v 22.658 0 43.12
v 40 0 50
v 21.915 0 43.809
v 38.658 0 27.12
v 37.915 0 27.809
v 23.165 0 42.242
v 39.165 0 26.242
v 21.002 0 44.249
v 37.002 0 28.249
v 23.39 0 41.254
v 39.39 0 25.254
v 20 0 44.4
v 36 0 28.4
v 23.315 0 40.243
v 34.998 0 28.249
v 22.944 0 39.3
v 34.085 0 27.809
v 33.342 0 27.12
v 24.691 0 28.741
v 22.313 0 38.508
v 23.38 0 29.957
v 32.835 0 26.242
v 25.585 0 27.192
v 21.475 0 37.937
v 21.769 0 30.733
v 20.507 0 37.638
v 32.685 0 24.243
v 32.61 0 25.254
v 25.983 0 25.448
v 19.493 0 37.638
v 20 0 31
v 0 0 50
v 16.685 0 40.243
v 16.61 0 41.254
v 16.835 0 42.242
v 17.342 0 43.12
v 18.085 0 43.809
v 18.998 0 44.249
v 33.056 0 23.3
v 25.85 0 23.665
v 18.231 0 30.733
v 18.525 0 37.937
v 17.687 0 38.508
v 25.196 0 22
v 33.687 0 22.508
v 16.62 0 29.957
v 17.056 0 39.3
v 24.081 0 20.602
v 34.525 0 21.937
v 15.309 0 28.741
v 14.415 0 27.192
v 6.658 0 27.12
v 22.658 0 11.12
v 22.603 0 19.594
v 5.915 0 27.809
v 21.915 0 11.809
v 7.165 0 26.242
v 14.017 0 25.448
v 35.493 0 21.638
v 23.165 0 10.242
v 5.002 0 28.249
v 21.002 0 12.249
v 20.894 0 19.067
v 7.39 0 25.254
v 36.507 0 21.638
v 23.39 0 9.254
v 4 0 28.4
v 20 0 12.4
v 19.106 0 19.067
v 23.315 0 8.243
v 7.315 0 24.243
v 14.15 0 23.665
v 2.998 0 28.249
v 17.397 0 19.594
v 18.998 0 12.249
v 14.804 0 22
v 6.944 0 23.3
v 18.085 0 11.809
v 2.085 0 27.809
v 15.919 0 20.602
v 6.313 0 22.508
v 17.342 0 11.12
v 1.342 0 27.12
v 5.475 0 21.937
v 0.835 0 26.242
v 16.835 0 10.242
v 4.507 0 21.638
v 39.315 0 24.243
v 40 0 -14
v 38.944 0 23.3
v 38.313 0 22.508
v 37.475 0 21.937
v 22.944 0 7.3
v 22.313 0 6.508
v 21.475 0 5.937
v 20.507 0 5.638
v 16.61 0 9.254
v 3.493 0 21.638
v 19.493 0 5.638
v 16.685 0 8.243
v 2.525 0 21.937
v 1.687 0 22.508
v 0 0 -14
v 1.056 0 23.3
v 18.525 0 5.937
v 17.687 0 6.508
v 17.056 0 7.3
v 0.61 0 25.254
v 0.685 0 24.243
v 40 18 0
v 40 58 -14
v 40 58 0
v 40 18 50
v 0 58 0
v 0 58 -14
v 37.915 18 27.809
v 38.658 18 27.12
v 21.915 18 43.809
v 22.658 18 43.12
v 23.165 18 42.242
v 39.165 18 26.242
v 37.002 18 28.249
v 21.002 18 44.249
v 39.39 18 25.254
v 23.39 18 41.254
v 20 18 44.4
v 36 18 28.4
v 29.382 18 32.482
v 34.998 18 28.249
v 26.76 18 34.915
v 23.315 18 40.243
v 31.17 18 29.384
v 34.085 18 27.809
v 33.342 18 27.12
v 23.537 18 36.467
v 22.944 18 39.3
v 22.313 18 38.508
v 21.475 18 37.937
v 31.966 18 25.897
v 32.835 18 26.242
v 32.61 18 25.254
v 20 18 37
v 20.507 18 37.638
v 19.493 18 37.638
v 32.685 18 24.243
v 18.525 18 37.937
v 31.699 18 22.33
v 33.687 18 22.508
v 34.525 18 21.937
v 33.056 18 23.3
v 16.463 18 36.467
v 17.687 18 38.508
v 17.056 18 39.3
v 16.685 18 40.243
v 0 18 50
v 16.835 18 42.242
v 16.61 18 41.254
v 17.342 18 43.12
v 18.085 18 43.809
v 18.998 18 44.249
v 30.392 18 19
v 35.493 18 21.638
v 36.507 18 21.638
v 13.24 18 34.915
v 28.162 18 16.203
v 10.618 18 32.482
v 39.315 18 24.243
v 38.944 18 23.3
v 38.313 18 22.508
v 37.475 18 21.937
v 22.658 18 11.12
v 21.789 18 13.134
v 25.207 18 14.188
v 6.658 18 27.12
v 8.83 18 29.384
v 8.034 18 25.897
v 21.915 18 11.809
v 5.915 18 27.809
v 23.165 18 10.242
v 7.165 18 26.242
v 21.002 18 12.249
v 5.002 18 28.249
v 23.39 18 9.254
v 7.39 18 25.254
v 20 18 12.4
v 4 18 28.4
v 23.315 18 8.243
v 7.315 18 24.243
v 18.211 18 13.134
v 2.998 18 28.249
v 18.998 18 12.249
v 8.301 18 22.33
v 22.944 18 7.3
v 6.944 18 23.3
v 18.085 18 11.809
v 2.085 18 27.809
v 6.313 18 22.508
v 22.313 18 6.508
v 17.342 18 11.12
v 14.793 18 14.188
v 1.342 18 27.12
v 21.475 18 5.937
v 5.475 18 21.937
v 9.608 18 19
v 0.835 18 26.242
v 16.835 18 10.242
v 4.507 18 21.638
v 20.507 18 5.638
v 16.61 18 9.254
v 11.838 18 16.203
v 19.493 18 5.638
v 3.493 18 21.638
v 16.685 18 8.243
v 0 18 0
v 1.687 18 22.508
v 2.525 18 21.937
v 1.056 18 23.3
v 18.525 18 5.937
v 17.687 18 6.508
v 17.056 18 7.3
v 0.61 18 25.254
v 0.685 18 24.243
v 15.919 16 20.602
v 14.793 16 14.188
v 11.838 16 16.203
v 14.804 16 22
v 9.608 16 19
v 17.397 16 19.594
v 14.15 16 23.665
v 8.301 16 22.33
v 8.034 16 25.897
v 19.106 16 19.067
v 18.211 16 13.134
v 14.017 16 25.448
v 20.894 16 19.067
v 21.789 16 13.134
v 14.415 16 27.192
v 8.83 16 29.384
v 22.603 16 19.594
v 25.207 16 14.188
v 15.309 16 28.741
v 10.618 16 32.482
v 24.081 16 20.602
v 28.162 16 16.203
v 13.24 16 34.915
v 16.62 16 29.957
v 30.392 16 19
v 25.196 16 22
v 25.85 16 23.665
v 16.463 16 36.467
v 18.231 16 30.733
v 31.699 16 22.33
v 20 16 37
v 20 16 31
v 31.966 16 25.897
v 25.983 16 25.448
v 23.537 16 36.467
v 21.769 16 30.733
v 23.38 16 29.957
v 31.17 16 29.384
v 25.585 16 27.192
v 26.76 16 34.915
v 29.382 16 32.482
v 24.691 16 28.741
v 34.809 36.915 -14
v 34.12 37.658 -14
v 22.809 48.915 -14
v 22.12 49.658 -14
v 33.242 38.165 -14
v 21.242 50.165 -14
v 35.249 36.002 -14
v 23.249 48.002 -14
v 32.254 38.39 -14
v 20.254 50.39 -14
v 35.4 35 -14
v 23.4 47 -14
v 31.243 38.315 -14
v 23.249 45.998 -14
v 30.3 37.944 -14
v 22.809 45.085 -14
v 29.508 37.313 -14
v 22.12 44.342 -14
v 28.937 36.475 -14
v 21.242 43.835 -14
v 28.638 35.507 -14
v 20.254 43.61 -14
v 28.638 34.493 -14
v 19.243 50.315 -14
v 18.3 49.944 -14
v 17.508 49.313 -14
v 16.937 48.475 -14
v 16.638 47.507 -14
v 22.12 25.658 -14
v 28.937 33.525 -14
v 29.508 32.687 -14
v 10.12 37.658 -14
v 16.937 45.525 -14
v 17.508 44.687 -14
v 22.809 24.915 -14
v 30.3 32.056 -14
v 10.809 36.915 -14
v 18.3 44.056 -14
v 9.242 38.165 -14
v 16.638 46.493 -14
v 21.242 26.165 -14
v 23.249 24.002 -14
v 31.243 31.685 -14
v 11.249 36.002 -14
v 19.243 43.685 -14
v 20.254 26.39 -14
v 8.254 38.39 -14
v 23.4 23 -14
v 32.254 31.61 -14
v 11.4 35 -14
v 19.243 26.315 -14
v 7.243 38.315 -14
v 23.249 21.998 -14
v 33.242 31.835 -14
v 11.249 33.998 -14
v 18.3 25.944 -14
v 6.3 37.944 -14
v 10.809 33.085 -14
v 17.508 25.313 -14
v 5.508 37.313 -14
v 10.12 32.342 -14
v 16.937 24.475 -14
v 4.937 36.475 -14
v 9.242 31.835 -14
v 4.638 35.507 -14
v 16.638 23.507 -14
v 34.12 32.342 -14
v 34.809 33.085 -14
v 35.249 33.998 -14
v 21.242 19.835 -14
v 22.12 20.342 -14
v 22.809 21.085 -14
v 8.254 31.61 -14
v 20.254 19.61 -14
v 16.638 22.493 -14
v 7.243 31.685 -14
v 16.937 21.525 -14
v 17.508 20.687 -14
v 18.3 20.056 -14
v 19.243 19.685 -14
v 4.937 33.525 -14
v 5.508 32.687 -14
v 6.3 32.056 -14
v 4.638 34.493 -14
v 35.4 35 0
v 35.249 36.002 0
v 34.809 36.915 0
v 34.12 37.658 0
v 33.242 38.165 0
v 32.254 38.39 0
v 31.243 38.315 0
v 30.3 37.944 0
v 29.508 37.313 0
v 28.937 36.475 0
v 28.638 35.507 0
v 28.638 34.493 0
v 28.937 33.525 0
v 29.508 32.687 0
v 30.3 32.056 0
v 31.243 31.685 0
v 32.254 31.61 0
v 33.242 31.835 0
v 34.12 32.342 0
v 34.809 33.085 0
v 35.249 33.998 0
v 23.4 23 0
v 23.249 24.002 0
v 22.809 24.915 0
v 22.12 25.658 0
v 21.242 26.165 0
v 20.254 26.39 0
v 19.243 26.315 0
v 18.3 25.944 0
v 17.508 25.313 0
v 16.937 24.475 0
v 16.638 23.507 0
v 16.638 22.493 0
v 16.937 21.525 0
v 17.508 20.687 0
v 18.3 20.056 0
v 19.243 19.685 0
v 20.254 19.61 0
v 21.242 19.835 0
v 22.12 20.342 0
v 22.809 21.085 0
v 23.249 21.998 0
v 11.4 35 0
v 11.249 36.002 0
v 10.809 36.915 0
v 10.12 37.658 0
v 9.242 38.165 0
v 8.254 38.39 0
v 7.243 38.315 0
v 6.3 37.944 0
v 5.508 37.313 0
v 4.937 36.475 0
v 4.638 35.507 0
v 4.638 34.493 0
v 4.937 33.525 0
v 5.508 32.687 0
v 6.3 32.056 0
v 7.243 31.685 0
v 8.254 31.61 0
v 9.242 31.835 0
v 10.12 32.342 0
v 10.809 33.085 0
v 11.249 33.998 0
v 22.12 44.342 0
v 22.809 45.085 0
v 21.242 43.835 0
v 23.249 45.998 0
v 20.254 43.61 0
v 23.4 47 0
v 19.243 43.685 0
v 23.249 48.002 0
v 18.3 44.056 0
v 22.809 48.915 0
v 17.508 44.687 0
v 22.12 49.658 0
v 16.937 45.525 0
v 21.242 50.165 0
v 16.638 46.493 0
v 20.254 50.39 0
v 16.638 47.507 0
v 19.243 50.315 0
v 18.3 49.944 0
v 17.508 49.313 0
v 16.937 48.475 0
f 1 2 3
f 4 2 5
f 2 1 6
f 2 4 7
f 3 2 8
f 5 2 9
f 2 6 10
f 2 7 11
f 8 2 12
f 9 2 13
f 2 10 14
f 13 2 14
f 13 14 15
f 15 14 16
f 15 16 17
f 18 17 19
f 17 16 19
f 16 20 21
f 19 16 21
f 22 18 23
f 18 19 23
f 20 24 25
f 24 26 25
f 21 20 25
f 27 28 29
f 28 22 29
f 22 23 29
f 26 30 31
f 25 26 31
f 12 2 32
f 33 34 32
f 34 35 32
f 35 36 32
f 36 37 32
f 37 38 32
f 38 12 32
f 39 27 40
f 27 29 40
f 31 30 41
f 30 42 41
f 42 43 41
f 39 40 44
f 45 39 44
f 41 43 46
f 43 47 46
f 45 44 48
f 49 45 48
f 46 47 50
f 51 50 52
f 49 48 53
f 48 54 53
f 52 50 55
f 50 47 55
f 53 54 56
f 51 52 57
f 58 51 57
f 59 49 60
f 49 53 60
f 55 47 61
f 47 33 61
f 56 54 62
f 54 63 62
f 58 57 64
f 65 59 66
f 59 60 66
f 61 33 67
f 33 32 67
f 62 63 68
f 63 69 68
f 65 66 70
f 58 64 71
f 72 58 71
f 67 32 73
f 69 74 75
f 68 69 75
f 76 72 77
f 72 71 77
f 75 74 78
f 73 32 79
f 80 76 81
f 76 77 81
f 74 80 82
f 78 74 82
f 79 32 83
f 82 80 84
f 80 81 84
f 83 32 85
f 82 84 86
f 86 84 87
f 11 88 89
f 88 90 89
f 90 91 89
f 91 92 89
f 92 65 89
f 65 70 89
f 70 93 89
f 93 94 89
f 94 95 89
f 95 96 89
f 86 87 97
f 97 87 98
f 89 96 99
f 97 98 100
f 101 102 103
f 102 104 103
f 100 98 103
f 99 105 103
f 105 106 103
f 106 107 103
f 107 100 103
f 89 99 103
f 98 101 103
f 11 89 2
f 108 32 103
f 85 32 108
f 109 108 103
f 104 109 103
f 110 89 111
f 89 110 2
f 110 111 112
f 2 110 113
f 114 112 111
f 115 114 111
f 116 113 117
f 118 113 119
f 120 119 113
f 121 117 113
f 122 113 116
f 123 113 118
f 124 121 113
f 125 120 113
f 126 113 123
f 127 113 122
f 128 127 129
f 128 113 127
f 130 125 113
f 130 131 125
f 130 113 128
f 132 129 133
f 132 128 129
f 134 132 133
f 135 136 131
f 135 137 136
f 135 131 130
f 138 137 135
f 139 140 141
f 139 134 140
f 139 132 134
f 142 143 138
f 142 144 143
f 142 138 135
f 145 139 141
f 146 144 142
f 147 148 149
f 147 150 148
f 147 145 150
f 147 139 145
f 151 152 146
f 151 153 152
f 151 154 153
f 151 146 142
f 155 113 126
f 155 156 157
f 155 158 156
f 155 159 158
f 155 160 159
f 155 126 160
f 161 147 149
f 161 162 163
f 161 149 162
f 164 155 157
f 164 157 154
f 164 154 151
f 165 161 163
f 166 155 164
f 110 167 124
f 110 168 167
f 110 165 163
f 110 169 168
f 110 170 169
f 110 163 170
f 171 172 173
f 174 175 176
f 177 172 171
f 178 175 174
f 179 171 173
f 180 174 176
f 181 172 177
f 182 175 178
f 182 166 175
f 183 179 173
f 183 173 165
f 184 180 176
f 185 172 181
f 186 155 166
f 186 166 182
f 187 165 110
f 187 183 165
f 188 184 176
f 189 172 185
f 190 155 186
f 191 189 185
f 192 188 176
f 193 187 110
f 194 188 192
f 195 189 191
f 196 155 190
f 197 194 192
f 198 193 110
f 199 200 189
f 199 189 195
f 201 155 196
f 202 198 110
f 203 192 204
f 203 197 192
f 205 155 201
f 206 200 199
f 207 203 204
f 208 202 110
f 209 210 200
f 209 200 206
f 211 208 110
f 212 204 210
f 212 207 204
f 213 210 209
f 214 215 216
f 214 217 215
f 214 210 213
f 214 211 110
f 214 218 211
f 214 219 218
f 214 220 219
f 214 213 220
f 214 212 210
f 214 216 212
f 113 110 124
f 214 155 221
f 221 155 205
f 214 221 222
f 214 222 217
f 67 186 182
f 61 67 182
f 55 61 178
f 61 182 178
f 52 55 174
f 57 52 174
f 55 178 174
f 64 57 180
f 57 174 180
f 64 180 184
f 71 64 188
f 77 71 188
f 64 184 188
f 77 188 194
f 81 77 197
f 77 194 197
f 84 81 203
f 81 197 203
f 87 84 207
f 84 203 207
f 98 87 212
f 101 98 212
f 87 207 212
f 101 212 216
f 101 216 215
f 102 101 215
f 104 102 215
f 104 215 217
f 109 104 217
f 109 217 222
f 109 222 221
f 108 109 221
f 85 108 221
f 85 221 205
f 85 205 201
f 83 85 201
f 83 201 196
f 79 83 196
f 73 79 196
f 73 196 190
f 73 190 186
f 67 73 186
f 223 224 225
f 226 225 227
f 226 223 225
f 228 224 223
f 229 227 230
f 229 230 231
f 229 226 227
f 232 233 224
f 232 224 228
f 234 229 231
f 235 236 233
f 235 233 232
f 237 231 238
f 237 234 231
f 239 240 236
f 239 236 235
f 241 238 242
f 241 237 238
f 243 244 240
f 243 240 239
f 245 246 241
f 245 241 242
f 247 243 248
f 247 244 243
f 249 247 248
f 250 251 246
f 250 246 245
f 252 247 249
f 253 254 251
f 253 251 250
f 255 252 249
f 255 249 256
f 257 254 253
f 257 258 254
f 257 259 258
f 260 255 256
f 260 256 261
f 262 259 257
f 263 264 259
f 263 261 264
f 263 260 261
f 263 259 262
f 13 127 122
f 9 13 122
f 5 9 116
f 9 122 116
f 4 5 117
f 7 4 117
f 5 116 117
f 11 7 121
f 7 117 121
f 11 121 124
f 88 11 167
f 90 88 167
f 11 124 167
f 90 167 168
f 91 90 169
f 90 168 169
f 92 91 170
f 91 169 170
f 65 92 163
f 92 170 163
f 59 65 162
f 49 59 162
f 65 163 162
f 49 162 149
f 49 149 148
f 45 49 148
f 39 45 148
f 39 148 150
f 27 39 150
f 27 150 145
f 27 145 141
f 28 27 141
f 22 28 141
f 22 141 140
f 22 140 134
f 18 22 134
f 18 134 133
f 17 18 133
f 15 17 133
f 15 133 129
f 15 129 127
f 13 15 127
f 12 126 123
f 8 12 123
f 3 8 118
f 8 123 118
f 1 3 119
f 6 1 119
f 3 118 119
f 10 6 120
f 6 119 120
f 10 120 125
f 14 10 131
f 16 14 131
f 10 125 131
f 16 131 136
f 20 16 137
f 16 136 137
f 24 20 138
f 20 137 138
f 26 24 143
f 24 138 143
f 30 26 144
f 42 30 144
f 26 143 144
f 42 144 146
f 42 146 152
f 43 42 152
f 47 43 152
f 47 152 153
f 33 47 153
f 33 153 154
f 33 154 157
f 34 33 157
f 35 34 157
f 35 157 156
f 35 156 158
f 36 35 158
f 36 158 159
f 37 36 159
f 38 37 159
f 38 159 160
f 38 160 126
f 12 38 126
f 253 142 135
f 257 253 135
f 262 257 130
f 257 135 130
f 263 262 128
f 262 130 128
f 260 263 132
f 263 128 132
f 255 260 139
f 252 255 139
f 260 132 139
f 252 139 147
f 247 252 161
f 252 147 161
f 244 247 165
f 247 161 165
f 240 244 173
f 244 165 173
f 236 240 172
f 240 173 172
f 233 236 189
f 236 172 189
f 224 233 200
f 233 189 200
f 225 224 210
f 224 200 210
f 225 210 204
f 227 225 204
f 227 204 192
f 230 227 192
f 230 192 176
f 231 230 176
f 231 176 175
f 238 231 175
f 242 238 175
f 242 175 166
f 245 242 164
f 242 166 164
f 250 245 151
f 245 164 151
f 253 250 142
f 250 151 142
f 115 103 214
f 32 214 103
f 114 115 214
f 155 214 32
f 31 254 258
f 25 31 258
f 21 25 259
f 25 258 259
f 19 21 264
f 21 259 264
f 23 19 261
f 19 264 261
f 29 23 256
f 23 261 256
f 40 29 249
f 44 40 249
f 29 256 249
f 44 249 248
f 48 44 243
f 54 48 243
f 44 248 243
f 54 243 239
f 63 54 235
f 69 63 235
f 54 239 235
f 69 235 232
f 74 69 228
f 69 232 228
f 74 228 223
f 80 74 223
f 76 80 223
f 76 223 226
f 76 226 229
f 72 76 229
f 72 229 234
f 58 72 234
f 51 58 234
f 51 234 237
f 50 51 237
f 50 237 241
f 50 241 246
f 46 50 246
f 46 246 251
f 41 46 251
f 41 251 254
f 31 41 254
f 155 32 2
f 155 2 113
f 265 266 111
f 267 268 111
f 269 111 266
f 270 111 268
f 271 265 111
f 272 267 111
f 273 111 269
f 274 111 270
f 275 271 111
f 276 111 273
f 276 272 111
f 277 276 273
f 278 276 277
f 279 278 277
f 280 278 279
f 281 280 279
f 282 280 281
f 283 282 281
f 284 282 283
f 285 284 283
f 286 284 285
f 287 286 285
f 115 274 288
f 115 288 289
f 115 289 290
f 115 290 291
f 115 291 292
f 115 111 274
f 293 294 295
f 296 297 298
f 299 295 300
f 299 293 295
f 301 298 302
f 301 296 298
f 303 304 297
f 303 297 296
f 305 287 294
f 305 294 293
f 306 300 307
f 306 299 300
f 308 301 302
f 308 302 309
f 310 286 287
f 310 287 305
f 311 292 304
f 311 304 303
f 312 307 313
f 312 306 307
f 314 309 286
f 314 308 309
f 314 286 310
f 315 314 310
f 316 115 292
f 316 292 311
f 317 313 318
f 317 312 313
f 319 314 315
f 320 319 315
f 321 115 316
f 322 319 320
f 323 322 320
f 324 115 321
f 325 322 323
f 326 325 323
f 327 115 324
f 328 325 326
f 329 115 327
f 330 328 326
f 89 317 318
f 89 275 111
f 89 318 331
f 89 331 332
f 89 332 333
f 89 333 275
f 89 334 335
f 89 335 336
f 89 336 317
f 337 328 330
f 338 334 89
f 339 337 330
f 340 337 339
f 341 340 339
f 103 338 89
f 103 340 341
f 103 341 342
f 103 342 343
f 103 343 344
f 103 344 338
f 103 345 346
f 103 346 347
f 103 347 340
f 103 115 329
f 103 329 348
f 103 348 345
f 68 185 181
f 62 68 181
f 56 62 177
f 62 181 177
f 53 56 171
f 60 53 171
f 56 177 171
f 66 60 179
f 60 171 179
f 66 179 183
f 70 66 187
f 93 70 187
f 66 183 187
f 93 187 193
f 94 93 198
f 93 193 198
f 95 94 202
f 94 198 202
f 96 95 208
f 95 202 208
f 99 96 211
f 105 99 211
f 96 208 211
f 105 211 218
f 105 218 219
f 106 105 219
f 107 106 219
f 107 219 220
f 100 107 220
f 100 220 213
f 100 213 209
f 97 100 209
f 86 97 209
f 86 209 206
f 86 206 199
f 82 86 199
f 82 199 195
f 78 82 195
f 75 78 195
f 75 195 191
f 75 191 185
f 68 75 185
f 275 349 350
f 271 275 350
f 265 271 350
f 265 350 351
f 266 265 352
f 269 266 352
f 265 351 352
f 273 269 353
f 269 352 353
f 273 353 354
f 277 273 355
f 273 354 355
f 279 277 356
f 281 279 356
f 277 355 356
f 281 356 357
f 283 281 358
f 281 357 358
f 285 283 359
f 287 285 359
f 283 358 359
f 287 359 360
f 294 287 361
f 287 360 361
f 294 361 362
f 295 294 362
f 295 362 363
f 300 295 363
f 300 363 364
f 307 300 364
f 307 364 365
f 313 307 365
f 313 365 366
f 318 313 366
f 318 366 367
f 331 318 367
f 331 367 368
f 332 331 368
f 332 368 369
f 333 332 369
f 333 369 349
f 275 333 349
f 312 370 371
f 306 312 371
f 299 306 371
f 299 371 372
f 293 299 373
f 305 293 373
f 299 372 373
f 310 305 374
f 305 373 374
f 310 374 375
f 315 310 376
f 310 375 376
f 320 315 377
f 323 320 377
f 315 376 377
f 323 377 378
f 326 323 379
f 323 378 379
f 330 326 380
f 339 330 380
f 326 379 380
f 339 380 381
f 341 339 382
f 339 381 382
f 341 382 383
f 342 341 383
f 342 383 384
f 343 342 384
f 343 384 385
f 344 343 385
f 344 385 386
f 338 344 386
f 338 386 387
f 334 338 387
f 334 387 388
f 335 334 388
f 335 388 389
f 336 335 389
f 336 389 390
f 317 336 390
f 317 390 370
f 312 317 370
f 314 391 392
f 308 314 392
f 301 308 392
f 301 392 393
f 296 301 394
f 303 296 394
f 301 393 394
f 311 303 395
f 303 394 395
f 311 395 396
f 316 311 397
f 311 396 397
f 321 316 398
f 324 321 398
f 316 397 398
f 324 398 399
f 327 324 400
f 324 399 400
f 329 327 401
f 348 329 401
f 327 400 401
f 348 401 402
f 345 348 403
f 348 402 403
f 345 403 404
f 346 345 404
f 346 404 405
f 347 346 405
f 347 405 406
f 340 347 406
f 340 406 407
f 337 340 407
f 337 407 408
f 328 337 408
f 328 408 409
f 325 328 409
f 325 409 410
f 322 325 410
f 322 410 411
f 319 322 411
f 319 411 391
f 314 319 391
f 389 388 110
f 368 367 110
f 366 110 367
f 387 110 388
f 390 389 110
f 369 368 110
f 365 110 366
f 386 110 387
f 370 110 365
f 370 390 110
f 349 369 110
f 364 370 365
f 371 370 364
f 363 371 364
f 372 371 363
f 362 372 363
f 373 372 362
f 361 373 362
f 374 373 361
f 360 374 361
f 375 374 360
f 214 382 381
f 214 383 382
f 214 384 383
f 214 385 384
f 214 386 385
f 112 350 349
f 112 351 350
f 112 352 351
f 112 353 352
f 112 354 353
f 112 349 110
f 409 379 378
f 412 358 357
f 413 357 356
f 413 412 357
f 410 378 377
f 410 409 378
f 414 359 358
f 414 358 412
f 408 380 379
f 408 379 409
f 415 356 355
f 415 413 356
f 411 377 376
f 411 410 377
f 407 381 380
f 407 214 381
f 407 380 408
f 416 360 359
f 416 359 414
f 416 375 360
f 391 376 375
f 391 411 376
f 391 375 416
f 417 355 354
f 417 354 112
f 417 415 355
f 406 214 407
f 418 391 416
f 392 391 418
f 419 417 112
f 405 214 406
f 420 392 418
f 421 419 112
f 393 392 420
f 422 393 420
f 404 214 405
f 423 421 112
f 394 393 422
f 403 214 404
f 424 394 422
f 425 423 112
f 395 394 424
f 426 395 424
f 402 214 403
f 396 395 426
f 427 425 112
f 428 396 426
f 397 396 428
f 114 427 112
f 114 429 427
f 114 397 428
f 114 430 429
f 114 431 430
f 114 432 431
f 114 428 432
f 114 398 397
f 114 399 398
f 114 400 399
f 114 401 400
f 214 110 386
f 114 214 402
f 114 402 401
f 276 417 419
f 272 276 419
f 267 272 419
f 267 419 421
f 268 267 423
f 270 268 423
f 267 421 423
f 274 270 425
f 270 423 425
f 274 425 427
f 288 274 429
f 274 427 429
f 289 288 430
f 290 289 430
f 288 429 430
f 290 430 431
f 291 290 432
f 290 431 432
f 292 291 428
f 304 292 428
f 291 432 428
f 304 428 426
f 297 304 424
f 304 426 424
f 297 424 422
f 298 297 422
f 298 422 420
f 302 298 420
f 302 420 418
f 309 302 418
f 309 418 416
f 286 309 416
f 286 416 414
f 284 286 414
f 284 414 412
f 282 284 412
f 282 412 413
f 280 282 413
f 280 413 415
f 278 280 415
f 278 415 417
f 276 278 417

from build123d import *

# Parameters (mm, degrees)
BOSS_EXTRUDE2_DEPTH = 40
SKETCH4_R           = 12
CUT_EXTRUDE4_DEPTH  = 2
SKETCH5_R           = 6
CUT_EXTRUDE5_DEPTH  = 77.576758876
SKETCH6_R           = 3.4
CUT_EXTRUDE6_DEPTH  = 76.498344353
SKETCH7_R           = 3.4
CUT_EXTRUDE7_DEPTH  = 87.394444266


with BuildPart() as part:
    # Sketch1 → Boss-Extrude2 (new body)
    with BuildSketch(Plane(origin=(0, 0, 0), x_dir=(0, 0, -1), z_dir=(1, 0, 0))):
        Polygon((0, 0), (-50, 0), (-50, 18), (0, 18), (0, 58), (14, 58), (14, 0), align=None)
    extrude(amount=BOSS_EXTRUDE2_DEPTH)

    # Sketch4 → Cut-Extrude4 (cut)
    with BuildSketch(Plane(origin=(0, 18, 0), x_dir=(1, 0, 0), z_dir=(0, 1, 0))):
        with Locations(Location((20, -25, 0), (0, 0, 270))):
            Circle(SKETCH4_R)
    extrude(amount=-CUT_EXTRUDE4_DEPTH, mode=Mode.SUBTRACT)

    # Sketch5 → Cut-Extrude5 (cut, through all)
    with BuildSketch(Plane(origin=(0, 16, 0), x_dir=(1, 0, 0), z_dir=(0, 1, 0))):
        with Locations(Location((20, -25, 0), (0, 0, 270))):
            Circle(SKETCH5_R)
    extrude(amount=-CUT_EXTRUDE5_DEPTH, mode=Mode.SUBTRACT)

    # Sketch6 → Cut-Extrude6 (cut, through all)
    with BuildSketch(Plane(origin=(0, 18, 0), x_dir=(1, 0, 0), z_dir=(0, 1, 0))):
        with Locations(Location((20, -9, 0), (0, 0, 270))):
            Circle(SKETCH6_R)
        with Locations(Location((36, -25, 0), (0, 0, 270))):
            Circle(SKETCH6_R)
        with Locations(Location((20, -41, 0), (0, 0, 270))):
            Circle(SKETCH6_R)
        with Locations(Location((4, -25, 0), (0, 0, 270))):
            Circle(SKETCH6_R)
    extrude(amount=-CUT_EXTRUDE6_DEPTH, mode=Mode.SUBTRACT)

    # Sketch7 → Cut-Extrude7 (cut, through all)
    with BuildSketch(Plane.XY):
        with Locations((20, 47)):
            Circle(SKETCH7_R)
        with Locations((32, 35)):
            Circle(SKETCH7_R)
        with Locations((20, 23)):
            Circle(SKETCH7_R)
        with Locations((8, 35)):
            Circle(SKETCH7_R)
    extrude(amount=-CUT_EXTRUDE7_DEPTH, mode=Mode.SUBTRACT)


solid = part.part
